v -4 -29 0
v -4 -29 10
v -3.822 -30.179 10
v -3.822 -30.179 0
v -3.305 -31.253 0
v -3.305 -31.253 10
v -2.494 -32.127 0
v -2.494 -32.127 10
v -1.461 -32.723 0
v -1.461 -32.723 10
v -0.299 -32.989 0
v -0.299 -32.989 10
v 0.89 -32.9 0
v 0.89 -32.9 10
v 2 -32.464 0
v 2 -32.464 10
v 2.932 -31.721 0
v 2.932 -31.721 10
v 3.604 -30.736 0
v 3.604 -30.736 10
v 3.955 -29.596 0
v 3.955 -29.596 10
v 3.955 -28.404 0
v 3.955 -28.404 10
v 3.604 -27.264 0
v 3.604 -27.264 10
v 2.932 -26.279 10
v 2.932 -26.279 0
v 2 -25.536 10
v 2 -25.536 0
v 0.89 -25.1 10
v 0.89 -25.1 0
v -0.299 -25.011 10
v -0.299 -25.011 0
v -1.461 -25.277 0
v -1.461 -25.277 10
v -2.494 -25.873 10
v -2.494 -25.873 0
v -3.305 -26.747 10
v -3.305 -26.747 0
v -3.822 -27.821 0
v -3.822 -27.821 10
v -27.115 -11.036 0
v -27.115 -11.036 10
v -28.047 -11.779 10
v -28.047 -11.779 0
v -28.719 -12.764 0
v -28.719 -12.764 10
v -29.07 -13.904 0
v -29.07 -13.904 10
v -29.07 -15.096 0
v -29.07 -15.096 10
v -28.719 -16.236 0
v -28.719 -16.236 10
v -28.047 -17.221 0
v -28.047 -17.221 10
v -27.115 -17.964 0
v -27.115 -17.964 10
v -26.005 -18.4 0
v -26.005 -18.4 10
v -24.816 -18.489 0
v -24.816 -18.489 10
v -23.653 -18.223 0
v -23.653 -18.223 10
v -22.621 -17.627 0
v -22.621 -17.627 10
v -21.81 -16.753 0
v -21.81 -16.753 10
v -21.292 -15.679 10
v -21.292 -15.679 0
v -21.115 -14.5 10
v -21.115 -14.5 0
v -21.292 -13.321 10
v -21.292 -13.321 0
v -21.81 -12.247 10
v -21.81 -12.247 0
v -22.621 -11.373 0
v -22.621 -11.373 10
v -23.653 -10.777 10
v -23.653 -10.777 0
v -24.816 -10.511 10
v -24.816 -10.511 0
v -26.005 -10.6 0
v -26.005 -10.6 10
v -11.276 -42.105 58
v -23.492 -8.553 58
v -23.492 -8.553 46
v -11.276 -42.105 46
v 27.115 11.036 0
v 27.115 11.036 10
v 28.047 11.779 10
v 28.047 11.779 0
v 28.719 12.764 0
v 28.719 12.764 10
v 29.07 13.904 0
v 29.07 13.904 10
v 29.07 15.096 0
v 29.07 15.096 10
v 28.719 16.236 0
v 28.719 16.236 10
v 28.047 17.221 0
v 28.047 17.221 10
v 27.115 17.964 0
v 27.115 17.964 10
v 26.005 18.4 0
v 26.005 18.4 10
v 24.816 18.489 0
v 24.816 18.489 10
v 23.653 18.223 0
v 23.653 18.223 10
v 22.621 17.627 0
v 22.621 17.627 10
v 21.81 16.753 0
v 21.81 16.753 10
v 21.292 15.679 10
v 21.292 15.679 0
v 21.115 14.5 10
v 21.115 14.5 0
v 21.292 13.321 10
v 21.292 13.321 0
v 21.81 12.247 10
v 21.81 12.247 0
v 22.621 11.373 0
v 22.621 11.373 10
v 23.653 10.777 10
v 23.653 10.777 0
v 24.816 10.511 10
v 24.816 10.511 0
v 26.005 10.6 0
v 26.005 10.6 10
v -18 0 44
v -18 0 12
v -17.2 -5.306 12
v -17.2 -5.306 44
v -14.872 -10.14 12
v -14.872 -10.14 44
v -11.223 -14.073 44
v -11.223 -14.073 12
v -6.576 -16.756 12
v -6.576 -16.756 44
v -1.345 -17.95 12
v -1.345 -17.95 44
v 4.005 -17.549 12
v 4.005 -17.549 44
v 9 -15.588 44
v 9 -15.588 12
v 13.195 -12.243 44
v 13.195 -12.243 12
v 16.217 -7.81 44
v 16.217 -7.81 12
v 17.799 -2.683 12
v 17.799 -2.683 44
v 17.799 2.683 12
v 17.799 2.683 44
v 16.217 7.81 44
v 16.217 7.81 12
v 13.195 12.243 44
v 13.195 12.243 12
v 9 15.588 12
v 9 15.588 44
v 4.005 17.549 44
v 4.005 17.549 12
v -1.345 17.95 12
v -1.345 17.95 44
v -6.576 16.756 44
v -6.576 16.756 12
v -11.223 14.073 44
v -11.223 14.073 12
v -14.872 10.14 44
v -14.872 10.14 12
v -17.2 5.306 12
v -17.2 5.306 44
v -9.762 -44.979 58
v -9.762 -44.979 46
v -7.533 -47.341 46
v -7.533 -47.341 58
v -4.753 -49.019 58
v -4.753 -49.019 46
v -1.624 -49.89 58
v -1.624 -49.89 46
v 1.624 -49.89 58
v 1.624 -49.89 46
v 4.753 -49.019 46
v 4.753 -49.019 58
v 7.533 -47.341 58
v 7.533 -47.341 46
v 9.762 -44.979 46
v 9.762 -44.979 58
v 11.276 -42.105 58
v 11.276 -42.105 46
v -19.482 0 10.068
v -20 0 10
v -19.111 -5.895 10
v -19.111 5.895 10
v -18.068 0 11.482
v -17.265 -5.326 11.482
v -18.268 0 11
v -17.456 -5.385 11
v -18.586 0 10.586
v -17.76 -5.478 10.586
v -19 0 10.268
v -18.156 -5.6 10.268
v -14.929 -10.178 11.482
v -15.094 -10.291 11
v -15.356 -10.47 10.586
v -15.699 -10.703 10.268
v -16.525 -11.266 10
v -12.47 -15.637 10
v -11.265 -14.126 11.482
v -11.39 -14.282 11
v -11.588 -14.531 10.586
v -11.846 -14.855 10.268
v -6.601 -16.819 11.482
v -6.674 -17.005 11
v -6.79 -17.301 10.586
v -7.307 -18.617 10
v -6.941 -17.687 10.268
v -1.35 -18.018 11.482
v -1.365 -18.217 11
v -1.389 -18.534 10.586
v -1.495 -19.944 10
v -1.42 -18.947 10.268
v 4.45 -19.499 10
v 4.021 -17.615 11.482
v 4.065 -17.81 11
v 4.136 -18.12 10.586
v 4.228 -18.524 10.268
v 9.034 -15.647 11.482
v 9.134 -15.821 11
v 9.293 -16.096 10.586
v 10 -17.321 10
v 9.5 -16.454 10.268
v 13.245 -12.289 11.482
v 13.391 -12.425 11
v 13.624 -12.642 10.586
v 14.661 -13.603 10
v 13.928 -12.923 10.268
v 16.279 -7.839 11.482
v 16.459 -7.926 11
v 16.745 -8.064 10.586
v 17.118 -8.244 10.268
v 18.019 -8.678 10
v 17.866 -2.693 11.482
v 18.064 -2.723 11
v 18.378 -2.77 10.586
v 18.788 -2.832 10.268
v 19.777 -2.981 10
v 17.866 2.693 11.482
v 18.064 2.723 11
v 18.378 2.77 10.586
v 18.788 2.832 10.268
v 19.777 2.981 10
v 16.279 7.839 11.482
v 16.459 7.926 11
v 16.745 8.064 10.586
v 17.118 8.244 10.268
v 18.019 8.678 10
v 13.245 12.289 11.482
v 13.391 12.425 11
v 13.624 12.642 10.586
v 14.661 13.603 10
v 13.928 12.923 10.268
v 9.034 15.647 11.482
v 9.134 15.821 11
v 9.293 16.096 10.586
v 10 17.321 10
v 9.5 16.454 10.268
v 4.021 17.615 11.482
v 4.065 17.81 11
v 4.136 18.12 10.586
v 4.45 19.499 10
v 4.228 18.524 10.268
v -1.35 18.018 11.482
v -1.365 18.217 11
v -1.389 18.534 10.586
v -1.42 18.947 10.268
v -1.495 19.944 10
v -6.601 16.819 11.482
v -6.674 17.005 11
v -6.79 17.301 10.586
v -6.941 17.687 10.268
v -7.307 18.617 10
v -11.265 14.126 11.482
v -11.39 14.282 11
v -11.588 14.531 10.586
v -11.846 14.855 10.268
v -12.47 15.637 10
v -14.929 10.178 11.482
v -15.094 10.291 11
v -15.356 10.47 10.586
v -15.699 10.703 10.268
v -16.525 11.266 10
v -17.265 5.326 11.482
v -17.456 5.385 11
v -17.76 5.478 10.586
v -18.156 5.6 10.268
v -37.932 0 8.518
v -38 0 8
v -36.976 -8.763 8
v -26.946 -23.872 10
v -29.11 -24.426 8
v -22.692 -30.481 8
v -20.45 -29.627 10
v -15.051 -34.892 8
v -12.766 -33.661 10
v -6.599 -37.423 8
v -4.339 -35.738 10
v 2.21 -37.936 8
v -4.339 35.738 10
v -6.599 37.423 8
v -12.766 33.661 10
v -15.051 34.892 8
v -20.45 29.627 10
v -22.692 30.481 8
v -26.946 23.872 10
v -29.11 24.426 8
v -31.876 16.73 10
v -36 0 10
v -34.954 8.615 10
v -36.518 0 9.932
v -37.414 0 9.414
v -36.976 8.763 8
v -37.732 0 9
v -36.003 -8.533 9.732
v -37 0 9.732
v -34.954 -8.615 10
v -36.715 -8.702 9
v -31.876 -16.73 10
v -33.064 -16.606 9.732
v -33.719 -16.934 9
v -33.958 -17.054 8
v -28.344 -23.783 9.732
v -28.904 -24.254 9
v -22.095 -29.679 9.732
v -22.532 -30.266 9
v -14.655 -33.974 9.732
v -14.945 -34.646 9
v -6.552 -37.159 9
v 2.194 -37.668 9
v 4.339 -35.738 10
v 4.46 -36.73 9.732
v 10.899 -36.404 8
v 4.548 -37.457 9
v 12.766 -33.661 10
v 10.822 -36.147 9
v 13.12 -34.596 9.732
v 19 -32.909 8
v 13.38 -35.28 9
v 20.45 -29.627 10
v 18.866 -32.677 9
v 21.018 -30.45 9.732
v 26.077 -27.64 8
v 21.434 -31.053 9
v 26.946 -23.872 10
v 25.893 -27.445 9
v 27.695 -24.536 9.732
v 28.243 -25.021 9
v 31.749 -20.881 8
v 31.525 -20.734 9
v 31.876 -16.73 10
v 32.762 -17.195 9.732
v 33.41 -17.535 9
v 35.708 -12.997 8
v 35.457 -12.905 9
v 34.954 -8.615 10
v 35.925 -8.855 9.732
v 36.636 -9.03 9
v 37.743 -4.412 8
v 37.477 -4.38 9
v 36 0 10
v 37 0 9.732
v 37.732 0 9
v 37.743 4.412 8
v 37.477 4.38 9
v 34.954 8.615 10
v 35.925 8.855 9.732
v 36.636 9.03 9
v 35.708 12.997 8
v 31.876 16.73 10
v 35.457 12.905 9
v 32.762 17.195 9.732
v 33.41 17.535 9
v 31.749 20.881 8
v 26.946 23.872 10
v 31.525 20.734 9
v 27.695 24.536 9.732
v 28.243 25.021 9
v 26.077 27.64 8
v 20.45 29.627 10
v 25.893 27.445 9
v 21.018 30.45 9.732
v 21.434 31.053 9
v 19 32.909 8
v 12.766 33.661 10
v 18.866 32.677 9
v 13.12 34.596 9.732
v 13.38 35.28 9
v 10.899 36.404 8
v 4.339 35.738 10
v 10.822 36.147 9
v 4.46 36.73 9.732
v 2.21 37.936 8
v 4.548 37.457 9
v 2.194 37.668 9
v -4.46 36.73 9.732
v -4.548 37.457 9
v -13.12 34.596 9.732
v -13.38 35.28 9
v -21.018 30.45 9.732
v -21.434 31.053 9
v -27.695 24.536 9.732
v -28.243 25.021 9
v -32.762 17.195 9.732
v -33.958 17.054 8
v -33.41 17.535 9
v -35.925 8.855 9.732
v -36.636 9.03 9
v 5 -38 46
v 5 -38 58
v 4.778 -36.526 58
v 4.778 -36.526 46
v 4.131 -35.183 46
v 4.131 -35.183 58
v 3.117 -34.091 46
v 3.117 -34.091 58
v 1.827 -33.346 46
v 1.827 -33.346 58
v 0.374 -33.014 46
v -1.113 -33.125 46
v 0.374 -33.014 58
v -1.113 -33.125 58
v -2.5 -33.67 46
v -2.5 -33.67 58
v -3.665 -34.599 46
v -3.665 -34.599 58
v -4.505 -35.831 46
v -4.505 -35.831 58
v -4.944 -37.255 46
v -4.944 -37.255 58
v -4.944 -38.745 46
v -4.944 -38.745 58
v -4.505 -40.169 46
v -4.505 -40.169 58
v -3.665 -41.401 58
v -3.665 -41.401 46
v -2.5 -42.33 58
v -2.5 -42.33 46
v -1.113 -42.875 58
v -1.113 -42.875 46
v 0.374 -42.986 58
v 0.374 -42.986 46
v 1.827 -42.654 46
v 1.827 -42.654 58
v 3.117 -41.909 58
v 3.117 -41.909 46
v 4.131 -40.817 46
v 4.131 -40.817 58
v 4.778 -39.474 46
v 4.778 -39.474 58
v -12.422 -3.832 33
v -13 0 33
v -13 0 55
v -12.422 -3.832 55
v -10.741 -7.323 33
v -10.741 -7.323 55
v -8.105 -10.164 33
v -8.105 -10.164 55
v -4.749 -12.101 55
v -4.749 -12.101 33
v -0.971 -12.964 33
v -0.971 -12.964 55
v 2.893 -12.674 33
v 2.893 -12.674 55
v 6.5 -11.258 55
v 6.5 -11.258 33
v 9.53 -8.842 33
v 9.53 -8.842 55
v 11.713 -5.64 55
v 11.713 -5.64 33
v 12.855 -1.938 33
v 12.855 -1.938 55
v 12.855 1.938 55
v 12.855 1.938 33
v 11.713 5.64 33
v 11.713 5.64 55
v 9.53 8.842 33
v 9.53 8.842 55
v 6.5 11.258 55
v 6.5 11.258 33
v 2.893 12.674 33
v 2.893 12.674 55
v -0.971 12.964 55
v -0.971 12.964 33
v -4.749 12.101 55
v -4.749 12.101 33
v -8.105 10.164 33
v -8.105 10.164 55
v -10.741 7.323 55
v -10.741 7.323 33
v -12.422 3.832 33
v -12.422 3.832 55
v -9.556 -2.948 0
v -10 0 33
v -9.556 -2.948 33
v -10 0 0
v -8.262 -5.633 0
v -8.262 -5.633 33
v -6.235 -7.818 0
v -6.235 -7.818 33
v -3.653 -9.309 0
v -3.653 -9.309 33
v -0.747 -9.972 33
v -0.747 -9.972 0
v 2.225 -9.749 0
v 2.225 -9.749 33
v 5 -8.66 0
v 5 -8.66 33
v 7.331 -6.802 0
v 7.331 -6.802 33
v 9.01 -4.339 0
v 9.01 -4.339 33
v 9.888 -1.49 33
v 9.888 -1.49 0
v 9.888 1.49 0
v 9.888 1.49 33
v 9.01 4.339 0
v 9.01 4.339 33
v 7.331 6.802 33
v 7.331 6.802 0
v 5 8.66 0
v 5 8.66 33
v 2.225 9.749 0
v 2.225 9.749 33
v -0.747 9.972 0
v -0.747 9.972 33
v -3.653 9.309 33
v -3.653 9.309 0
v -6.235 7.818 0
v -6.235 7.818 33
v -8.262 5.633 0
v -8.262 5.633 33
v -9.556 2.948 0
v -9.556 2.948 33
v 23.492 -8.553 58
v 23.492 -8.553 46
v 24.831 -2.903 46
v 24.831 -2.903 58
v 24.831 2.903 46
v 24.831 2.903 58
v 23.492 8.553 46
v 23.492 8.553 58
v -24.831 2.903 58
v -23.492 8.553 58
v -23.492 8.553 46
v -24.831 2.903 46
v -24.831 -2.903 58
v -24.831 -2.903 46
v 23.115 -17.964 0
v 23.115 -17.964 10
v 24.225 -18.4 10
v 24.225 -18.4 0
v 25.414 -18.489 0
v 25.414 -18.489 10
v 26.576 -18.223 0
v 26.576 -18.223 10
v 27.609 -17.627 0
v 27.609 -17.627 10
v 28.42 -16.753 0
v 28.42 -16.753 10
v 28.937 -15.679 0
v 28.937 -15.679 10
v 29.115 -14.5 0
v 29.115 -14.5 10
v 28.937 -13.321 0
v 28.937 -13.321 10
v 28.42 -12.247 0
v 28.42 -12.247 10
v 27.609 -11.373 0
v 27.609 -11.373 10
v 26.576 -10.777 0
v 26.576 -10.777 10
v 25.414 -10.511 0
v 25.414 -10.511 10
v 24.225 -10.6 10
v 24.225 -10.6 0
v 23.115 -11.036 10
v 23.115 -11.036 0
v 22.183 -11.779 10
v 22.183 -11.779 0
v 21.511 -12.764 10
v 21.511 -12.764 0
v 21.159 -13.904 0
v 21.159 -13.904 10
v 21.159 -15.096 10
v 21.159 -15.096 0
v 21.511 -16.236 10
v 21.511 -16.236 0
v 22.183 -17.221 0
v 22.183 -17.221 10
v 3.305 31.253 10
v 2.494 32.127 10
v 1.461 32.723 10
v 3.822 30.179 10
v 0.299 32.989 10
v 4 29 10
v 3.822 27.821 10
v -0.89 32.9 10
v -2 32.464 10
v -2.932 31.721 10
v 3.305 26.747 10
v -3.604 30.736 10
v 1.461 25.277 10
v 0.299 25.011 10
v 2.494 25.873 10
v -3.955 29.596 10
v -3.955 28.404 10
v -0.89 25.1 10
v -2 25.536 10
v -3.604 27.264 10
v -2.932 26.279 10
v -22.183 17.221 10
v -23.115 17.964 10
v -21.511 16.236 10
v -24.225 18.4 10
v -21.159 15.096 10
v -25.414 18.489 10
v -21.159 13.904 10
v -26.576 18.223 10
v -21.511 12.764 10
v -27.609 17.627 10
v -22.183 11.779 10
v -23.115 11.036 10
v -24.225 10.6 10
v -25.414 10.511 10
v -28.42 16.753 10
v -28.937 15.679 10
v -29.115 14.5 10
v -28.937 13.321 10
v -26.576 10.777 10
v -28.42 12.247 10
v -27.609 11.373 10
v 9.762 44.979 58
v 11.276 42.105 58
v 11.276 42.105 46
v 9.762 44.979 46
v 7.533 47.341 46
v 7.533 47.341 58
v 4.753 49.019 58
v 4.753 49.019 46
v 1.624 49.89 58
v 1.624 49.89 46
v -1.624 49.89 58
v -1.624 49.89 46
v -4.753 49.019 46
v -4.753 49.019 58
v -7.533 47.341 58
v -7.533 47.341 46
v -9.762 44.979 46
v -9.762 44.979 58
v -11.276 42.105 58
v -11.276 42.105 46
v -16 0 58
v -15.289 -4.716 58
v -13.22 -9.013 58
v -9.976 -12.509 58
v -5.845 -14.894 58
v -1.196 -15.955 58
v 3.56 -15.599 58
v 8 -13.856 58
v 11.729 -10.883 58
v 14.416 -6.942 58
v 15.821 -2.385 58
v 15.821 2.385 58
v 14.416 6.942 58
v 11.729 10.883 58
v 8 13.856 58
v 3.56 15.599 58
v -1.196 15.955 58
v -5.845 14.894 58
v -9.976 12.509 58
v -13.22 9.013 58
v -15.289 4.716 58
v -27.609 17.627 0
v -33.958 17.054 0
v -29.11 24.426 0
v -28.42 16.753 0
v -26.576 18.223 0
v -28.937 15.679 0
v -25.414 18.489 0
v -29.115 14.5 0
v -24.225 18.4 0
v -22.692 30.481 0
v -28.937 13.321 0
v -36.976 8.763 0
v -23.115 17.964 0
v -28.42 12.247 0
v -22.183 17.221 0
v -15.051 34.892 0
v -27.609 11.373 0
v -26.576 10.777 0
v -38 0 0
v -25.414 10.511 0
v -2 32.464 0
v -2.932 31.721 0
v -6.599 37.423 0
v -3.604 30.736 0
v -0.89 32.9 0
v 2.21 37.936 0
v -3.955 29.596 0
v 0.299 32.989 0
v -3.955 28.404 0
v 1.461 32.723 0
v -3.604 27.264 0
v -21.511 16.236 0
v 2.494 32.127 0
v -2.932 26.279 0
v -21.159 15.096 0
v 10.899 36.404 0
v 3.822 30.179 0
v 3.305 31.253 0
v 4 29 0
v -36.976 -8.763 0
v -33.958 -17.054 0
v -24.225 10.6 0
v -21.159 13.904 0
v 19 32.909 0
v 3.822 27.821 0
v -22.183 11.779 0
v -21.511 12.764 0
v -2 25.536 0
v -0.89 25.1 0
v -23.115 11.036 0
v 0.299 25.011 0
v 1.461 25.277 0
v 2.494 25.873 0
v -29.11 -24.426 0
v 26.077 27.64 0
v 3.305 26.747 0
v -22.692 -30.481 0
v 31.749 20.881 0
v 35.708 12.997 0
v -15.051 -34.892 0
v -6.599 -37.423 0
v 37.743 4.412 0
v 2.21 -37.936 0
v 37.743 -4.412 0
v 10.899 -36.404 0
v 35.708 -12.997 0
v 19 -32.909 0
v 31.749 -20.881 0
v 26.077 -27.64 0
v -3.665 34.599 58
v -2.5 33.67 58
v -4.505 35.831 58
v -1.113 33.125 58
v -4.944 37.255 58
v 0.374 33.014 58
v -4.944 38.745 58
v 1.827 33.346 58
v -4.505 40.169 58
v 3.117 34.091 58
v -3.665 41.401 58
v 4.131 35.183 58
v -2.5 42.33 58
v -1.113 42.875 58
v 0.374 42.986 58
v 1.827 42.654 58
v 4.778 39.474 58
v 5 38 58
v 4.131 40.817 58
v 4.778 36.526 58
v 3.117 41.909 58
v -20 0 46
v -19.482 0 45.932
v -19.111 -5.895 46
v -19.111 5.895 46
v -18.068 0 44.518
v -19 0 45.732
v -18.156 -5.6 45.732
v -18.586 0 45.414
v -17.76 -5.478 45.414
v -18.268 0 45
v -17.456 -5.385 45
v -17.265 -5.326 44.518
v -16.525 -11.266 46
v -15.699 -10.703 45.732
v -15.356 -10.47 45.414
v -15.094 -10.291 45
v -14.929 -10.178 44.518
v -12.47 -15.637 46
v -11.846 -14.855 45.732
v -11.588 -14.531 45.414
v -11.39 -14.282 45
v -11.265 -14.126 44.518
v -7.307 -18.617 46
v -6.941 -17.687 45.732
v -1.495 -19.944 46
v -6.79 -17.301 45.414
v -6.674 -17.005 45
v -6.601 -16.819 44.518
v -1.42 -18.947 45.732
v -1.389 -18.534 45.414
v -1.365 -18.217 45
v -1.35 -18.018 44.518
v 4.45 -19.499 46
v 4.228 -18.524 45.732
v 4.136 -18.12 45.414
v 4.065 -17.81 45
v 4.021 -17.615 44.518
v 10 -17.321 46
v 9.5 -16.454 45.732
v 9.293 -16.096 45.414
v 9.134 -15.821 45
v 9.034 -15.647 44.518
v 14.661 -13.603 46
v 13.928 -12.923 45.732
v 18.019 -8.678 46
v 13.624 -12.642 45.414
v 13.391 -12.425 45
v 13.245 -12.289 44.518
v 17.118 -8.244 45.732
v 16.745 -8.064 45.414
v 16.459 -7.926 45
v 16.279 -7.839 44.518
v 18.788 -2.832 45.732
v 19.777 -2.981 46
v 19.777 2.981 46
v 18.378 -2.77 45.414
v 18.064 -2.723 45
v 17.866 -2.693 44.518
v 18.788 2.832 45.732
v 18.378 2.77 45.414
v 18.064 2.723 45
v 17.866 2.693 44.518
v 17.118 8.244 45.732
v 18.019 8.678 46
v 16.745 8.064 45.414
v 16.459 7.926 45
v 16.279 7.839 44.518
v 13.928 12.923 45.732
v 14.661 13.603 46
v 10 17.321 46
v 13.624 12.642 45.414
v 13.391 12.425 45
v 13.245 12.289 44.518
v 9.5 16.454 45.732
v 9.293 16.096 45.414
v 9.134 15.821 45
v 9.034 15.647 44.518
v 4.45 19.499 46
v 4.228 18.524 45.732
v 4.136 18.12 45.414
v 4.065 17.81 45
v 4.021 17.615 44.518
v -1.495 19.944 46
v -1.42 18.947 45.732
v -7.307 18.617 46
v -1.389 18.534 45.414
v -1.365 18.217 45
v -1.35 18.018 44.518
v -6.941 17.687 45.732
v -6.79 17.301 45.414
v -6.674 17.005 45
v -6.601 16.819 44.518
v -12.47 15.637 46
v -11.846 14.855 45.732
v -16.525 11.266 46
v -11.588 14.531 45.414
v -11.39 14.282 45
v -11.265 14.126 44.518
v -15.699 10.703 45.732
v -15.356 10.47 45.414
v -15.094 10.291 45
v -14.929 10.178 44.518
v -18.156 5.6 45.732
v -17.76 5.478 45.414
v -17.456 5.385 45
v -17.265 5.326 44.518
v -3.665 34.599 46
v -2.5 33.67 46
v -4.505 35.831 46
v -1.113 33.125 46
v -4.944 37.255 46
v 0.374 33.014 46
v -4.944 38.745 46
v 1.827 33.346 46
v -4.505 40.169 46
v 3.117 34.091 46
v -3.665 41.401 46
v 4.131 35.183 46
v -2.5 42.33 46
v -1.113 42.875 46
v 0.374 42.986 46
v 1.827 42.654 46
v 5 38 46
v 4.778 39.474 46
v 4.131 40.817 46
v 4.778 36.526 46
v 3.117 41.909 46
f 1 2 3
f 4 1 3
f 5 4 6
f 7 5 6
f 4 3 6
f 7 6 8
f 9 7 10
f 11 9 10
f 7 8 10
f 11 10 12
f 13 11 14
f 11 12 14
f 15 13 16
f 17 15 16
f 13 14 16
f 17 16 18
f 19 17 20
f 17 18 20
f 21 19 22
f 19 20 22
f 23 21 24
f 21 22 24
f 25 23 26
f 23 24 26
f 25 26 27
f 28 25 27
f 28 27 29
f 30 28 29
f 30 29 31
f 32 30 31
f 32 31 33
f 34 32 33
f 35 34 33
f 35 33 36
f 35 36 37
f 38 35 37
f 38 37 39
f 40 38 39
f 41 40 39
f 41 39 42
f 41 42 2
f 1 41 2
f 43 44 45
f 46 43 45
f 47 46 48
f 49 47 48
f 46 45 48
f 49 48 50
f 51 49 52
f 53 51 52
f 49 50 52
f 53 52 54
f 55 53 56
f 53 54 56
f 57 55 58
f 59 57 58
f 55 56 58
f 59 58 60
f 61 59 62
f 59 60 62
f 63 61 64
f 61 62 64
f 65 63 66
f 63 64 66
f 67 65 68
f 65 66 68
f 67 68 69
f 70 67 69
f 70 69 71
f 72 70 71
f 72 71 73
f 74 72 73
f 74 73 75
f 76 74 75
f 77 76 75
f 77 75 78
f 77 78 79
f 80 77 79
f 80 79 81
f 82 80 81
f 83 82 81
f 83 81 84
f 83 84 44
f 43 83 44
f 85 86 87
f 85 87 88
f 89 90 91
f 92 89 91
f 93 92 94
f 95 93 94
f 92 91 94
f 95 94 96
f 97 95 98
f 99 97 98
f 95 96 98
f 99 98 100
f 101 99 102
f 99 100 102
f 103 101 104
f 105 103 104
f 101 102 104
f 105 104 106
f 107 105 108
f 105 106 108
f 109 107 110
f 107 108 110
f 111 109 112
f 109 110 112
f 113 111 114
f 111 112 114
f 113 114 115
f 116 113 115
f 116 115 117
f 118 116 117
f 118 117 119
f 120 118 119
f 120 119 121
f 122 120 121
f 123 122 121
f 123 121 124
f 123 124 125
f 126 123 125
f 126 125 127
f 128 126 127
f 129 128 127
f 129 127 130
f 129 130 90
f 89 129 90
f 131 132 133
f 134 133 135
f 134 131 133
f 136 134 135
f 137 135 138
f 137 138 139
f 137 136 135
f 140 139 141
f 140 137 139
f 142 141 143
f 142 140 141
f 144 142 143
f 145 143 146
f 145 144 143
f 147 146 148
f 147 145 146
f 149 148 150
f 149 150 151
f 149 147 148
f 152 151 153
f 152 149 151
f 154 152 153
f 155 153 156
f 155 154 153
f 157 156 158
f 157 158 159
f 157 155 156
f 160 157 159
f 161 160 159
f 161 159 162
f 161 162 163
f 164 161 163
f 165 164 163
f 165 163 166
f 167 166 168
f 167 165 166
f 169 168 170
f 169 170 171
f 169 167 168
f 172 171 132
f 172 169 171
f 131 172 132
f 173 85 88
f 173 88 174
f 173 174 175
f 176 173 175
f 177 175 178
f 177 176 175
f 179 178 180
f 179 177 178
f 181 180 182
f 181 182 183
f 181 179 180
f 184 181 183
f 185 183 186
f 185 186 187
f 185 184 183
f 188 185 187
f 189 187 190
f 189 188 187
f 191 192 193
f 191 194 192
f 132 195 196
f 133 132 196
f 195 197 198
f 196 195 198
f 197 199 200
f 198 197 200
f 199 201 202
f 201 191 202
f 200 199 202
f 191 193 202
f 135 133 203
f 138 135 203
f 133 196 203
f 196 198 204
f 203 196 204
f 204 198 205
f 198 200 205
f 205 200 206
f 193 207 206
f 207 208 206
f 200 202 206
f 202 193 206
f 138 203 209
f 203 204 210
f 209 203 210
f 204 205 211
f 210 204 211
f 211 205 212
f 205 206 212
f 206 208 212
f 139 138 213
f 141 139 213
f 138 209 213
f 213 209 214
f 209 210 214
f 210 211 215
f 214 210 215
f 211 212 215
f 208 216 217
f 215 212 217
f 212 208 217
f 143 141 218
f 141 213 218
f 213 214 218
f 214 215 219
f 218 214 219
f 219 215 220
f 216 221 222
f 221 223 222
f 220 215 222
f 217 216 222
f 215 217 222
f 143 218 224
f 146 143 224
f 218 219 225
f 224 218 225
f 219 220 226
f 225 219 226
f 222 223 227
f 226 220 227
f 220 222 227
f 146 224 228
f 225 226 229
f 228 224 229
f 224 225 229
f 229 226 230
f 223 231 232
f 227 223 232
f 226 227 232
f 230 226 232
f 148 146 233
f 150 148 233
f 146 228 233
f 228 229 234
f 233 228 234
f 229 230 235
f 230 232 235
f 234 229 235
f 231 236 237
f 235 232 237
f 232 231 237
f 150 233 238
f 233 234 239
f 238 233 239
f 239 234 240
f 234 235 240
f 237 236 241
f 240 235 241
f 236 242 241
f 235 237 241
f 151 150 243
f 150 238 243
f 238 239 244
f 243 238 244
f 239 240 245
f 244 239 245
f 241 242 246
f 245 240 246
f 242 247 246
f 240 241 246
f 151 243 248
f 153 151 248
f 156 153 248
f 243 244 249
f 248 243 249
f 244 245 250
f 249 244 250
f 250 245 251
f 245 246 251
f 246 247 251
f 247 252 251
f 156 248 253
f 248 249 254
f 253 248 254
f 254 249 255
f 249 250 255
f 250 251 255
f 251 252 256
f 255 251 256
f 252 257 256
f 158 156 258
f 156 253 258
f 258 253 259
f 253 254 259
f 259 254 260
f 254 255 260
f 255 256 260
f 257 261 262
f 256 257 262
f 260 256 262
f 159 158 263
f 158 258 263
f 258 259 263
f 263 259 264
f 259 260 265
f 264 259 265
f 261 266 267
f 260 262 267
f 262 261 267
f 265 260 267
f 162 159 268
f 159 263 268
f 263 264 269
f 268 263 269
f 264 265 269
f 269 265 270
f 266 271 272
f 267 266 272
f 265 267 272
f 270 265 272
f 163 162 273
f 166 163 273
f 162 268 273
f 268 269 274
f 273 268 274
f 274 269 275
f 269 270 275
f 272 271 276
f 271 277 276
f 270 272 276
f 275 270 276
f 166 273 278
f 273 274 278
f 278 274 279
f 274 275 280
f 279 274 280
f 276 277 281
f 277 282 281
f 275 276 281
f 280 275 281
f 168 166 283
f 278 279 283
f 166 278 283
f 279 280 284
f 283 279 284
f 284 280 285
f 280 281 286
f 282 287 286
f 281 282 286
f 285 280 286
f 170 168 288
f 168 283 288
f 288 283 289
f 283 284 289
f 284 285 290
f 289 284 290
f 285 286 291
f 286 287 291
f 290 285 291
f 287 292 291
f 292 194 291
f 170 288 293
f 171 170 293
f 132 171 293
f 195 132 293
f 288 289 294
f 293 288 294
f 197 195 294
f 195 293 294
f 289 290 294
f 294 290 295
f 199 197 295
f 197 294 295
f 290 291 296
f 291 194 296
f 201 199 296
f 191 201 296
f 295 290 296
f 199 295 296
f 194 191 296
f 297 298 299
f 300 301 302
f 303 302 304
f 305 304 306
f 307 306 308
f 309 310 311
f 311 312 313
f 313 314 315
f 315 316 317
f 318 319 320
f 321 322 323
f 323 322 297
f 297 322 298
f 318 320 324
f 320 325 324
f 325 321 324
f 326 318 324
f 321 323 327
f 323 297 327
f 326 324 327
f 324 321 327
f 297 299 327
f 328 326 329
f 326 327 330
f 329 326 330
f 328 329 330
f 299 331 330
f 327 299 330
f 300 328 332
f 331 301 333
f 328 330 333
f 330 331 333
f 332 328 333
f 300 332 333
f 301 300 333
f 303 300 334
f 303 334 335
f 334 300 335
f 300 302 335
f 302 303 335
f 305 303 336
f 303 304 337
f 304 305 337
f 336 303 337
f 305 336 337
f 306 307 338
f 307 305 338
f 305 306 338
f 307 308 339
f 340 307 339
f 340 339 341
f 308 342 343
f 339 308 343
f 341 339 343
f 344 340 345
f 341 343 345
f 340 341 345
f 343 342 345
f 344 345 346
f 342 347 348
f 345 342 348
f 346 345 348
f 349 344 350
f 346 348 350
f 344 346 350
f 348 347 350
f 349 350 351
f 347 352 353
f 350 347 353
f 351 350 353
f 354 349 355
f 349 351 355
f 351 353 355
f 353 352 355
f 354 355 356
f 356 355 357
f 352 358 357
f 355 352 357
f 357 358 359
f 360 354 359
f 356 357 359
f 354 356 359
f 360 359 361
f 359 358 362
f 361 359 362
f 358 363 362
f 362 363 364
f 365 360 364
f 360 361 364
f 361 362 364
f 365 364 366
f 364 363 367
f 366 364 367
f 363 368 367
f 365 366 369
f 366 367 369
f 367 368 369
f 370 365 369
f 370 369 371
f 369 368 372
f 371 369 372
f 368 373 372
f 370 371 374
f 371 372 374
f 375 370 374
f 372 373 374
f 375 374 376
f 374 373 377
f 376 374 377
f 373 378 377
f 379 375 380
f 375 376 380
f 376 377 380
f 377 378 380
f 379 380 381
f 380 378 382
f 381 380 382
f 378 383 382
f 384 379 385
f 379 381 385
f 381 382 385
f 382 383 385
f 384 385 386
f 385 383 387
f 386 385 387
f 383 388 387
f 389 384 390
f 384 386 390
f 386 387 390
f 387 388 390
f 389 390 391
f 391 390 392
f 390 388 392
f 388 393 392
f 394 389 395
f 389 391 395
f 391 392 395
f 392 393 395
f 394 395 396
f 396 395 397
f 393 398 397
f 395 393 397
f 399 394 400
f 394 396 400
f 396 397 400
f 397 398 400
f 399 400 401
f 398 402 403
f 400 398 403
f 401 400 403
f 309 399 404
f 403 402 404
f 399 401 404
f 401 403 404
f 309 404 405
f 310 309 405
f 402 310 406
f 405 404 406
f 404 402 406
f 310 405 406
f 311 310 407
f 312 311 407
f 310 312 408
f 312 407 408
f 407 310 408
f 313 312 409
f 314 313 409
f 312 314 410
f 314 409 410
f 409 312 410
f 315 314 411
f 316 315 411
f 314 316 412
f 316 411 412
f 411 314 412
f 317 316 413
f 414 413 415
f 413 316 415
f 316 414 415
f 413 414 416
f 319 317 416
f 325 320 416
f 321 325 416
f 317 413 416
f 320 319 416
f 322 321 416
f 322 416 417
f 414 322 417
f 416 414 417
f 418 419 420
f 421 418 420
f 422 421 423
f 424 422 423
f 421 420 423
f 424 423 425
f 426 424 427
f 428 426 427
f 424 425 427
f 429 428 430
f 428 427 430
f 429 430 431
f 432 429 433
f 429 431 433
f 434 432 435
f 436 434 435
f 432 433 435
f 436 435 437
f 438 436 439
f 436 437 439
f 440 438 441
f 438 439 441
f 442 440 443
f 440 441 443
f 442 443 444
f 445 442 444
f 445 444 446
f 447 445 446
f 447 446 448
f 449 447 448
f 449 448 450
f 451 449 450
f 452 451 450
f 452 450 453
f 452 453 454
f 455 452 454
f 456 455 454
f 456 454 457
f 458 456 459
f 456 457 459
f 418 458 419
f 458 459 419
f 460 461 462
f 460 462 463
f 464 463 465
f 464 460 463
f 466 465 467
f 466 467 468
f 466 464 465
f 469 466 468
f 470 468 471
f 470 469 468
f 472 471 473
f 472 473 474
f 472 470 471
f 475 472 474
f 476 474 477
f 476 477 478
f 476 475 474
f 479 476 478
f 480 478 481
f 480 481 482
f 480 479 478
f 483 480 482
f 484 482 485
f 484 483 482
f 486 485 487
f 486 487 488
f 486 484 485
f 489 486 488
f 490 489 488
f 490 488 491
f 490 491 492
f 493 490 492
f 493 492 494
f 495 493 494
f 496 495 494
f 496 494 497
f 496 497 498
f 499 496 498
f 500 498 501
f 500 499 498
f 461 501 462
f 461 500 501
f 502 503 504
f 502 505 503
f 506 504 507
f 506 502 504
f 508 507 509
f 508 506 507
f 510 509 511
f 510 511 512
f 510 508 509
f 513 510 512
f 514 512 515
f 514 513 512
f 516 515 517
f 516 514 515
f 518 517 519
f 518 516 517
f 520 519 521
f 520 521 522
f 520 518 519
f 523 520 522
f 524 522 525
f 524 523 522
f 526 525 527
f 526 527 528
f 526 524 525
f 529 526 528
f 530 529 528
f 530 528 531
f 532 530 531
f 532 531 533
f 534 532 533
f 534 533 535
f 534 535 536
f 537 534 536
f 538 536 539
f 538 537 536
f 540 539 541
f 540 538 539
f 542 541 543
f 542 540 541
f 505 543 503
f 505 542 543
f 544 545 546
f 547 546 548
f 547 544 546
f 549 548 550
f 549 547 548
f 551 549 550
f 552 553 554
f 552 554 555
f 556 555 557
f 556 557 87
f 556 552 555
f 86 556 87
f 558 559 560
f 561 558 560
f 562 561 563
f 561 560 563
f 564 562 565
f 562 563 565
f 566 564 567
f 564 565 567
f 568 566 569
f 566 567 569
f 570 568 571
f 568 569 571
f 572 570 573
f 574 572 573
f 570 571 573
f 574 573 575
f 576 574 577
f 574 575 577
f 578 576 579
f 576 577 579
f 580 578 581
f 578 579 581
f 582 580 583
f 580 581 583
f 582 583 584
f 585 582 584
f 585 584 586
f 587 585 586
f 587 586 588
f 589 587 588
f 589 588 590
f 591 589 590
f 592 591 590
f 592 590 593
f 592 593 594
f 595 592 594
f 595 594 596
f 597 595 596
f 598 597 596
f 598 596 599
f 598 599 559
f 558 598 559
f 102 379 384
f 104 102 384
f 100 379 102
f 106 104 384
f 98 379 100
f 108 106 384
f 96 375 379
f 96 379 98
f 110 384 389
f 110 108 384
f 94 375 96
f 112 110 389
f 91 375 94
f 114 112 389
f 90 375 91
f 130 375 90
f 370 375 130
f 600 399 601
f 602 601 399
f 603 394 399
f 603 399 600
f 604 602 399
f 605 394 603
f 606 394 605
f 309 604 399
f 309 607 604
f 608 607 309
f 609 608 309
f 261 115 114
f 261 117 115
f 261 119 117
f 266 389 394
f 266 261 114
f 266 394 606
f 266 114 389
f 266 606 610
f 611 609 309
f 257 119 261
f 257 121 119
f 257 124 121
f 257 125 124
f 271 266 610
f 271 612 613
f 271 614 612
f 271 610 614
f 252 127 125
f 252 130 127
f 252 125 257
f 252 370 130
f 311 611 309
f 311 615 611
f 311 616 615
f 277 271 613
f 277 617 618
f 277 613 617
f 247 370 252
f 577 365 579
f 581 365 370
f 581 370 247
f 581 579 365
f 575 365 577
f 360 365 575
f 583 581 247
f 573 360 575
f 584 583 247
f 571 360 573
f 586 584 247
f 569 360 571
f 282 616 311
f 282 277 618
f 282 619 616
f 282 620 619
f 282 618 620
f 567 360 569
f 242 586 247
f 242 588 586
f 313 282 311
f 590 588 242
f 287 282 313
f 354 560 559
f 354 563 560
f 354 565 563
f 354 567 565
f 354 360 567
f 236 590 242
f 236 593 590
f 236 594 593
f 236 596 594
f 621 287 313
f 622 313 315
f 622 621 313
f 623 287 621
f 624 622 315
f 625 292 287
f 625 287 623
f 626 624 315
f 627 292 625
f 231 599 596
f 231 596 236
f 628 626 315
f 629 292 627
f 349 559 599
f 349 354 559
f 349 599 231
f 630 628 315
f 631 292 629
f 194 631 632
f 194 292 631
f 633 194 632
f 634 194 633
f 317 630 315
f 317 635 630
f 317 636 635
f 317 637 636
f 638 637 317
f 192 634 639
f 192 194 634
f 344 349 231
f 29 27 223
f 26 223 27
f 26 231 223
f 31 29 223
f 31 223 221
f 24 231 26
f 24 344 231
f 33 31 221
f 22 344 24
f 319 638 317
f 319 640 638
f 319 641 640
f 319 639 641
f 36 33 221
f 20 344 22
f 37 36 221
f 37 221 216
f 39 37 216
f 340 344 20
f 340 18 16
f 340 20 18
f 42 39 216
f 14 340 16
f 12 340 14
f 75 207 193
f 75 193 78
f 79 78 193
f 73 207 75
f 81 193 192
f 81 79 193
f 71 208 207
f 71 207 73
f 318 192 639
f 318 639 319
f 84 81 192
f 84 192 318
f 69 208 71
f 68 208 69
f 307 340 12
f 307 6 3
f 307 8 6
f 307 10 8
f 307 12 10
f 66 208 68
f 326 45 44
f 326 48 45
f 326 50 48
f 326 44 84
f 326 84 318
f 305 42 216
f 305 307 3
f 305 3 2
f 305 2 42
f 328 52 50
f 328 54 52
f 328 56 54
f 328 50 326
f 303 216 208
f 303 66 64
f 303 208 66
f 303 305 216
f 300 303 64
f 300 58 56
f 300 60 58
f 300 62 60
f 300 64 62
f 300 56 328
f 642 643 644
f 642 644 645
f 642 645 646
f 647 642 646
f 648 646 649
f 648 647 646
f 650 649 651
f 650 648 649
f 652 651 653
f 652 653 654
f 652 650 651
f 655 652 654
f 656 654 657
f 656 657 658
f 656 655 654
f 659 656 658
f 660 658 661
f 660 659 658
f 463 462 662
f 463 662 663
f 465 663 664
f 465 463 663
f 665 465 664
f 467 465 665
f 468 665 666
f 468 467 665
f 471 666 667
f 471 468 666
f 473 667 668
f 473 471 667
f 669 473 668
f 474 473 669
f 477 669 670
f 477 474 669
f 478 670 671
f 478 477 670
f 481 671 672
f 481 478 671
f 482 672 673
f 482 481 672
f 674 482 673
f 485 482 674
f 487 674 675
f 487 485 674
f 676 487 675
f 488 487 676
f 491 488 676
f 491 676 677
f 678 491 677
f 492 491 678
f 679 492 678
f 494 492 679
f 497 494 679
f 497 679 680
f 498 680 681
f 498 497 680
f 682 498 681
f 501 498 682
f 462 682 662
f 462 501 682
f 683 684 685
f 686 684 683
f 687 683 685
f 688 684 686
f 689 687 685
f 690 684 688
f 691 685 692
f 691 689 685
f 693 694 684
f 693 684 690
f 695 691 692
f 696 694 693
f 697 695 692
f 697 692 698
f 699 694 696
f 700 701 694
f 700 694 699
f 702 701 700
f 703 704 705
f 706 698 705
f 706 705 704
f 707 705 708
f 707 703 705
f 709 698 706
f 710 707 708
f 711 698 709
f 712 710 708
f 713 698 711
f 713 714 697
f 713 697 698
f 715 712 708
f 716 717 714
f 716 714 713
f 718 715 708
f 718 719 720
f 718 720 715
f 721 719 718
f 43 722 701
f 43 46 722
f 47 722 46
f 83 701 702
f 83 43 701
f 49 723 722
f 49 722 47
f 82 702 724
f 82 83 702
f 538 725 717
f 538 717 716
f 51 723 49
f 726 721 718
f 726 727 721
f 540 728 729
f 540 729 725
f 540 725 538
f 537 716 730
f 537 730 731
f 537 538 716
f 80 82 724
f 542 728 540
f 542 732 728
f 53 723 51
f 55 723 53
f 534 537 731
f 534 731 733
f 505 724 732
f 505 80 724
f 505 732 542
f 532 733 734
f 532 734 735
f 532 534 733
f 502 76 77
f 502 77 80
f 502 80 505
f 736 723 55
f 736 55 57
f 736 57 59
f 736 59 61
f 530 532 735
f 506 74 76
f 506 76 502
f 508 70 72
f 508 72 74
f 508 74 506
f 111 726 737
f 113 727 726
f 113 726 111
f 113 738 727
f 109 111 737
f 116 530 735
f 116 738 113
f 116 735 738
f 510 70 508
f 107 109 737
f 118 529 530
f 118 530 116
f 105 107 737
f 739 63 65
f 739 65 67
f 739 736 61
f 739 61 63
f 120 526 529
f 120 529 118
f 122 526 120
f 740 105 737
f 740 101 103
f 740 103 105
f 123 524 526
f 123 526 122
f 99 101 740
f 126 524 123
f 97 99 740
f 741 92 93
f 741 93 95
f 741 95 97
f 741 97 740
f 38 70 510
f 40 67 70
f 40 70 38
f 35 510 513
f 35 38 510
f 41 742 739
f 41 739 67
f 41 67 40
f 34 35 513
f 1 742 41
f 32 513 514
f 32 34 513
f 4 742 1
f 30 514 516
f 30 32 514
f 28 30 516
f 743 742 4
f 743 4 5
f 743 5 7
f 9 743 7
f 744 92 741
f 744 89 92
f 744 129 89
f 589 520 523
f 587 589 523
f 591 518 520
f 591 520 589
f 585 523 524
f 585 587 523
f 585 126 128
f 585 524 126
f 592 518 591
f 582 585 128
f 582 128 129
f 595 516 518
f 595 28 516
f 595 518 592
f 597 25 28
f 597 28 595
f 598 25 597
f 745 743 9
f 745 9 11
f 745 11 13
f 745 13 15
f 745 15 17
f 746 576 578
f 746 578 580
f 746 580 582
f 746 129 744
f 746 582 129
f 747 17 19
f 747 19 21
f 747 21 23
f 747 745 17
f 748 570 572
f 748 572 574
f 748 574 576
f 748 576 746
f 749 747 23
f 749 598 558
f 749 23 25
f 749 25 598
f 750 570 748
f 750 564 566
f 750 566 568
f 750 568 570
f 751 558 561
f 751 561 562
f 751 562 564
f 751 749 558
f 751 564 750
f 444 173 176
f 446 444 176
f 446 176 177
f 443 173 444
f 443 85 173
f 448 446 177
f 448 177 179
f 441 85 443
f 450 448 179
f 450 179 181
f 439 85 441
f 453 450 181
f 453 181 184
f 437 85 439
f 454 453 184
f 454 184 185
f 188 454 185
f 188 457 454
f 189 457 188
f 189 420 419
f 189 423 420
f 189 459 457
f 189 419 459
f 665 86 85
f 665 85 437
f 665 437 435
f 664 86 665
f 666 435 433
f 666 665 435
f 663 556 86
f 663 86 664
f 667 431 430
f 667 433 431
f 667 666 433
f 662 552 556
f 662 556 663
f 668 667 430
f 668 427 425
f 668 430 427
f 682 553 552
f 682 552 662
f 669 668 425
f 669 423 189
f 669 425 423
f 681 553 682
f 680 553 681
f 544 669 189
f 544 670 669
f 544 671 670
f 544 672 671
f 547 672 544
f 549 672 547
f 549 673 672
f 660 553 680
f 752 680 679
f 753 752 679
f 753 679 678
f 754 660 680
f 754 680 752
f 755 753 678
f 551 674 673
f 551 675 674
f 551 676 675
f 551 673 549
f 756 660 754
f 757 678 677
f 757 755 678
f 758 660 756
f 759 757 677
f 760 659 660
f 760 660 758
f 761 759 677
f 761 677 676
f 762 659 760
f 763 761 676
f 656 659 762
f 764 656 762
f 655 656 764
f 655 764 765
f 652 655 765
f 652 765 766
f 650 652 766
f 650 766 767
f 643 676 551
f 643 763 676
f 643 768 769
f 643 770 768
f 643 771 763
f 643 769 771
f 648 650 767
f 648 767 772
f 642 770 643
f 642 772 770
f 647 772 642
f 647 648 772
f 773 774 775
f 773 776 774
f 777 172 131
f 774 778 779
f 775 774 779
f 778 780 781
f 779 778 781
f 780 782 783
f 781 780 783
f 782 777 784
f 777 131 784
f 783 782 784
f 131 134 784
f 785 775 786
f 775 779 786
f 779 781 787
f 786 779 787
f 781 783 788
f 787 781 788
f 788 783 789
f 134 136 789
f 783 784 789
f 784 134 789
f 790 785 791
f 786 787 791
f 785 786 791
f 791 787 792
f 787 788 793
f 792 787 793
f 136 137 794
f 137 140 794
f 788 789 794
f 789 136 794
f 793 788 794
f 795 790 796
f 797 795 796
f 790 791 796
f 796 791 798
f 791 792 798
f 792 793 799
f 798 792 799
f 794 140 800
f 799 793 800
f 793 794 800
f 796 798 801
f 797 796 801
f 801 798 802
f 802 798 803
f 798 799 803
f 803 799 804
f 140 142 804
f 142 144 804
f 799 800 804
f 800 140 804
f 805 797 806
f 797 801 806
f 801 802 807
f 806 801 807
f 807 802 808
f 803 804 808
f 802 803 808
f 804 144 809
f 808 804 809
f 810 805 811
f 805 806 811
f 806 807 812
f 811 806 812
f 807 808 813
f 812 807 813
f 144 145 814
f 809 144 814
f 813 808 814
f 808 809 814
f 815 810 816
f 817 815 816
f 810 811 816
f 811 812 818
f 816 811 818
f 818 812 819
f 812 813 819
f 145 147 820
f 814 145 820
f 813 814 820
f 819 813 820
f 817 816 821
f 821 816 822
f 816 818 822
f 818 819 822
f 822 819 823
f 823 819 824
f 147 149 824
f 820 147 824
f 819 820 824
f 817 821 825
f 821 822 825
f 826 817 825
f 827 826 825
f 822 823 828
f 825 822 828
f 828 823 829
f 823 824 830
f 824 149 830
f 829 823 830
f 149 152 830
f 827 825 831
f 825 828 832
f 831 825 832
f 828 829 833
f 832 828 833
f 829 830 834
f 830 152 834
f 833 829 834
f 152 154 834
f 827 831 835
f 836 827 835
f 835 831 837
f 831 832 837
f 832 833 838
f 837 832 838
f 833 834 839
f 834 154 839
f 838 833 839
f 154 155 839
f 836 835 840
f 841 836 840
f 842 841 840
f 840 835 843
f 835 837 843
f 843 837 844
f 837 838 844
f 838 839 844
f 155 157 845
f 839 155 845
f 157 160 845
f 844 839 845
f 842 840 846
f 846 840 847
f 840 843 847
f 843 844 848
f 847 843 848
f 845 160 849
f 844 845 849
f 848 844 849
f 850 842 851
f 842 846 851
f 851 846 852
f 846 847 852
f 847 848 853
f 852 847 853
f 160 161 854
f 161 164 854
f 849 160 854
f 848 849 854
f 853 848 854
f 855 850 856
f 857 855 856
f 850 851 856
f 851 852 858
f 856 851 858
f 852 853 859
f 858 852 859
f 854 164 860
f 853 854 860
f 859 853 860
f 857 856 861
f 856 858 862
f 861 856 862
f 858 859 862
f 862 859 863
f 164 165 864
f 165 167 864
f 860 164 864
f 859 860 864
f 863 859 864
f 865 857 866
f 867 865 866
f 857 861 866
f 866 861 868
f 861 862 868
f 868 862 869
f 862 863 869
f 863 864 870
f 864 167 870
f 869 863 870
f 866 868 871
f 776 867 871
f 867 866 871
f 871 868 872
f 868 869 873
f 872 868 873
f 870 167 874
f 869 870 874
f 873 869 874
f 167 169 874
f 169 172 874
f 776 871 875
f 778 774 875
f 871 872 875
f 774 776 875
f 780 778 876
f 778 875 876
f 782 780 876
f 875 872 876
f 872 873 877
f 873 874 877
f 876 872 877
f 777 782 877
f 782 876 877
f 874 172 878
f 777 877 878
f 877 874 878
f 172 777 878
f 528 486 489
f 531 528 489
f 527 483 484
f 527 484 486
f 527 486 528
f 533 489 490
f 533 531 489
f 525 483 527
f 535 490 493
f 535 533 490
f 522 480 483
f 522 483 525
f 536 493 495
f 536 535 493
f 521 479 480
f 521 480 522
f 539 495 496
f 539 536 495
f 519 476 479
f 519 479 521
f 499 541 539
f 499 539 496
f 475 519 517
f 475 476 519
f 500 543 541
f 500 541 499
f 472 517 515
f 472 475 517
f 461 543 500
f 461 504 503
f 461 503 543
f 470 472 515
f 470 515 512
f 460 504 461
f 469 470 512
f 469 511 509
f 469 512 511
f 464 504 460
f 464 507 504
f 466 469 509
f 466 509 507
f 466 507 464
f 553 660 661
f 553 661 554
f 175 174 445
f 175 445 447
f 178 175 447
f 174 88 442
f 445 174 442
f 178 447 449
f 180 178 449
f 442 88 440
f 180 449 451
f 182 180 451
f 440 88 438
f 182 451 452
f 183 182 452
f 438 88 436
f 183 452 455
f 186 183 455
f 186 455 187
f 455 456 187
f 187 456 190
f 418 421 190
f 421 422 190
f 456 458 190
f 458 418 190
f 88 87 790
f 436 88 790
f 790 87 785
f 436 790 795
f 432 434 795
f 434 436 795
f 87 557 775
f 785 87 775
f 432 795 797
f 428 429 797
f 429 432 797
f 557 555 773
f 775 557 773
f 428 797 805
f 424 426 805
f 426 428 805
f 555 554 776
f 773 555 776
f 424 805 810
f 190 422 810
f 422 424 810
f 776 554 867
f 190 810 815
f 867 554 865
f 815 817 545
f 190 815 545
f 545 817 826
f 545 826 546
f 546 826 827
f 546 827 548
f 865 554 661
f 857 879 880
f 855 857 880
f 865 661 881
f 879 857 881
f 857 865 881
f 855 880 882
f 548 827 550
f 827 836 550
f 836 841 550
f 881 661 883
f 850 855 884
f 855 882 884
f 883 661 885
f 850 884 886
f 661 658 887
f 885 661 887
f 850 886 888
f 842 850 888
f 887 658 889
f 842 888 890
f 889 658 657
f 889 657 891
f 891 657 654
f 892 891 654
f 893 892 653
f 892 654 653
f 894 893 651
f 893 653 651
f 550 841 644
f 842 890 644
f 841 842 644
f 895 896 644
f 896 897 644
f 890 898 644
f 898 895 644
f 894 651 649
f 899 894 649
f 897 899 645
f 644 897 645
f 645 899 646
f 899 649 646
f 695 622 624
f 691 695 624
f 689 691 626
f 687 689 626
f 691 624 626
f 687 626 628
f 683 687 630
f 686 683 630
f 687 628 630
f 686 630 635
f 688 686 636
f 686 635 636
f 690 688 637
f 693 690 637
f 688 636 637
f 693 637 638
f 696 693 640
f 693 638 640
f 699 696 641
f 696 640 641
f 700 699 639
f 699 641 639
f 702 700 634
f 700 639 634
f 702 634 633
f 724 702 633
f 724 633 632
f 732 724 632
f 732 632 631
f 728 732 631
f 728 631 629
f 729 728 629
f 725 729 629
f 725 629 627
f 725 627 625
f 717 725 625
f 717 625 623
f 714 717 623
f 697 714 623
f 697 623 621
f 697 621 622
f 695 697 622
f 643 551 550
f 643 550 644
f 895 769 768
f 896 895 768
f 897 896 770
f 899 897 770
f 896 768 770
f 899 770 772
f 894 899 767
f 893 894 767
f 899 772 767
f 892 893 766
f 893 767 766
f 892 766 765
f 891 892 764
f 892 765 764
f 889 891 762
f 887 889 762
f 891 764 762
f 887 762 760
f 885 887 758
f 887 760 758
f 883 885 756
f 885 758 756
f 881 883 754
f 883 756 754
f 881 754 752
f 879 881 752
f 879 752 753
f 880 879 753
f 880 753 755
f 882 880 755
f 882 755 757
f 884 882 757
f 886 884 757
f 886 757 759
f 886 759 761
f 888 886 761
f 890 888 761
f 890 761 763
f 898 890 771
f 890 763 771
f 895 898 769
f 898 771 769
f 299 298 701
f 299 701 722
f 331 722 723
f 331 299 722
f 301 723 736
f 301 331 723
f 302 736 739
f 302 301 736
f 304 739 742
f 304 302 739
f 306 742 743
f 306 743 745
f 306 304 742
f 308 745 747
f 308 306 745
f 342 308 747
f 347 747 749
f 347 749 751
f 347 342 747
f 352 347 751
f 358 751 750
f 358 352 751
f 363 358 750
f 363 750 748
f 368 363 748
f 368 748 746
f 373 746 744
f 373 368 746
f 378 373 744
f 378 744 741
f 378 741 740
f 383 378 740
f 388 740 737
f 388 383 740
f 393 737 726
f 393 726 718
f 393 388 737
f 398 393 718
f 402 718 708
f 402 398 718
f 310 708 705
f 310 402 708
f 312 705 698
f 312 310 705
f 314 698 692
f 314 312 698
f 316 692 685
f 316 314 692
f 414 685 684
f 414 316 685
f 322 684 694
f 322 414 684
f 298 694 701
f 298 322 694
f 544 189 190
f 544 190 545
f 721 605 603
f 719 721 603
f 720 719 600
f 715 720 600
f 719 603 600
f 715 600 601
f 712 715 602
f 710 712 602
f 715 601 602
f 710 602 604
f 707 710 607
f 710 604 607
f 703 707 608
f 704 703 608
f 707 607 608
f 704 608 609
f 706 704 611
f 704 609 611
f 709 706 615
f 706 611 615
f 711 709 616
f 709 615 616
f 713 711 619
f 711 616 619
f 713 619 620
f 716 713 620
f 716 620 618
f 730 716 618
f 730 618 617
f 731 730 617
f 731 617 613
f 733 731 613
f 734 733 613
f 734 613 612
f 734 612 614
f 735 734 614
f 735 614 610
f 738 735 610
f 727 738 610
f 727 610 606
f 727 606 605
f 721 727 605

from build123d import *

# Parameters (mm, degrees)
SKETCH_2_R               = 4
CUT_EXTRUDE_1_DEPTH      = 73.055534139
PATTERN_CIRCULAR_1_COUNT = 6
SKETCH_3_R               = 5
SKETCH_3_R_2             = 25
SKETCH_3_R_3             = 18
EXTRUDE_2_DEPTH          = 12
CHAMFER_1_SIZE           = 3
FILLET_1_R               = 2


with BuildPart() as part:
    # 草圖1 → 旋轉1 (revolve)
    with BuildSketch(Plane(origin=(0, 0, 0), x_dir=(0, 0, -1), z_dir=(1, 0, 0)), mode=Mode.PRIVATE) as revolve_1_sk:
        Polygon((0, 0), (0, 38), (-10, 38), (-10, 18), (-58, 18), (-58, 0), align=None)
    revolve(revolve_1_sk.sketch.rotate(Axis((0, 0, 0), (0, 0, 1)), 90), axis=Axis((0, 0, 0), (0, 0, 1)))

    # 草圖2 → 伸長1 (cut, through all)
    with BuildSketch(Plane.XY.offset(10)):
        with Locations((0, 29)):
            Circle(SKETCH_2_R)
    cut_extrude_1 = extrude(amount=-CUT_EXTRUDE_1_DEPTH, mode=Mode.SUBTRACT)

    # 環狀複製排列1: 伸長1 ×6 about axis
    pattern_circular_1_axis = Axis((0, 0, 0), (0, 0, 1))
    for i in range(1, PATTERN_CIRCULAR_1_COUNT):
        add(cut_extrude_1.rotate(pattern_circular_1_axis, i * 360 / PATTERN_CIRCULAR_1_COUNT), mode=Mode.SUBTRACT)

    # 草圖3 → 伸長2 (add)
    # profile 1 of 3: a face of its own
    with BuildSketch(Plane.XY.offset(58)):
        with BuildLine():
            Line((-11.275939624, 42.105263158), (-23.491540883, 8.552631579))
            ThreePointArc((-23.491540883, 8.552631579), (0, 25), (23.491540883, 8.552631579))
            Line((23.491540883, 8.552631579), (11.275939624, 42.105263158))
            ThreePointArc((11.275939624, 42.105263158), (0, 50), (-11.275939624, 42.105263158))
        make_face()
        with Locations((0, 38)):
            Circle(SKETCH_3_R, mode=Mode.SUBTRACT)
    # profile 2 of 3: a face of its own
    with BuildSketch(Plane.XY.offset(58)):
        Circle(SKETCH_3_R_2)
        with Locations(Location((0, 0, 0), (0, 0, 180))):
            Circle(SKETCH_3_R_3, mode=Mode.SUBTRACT)
    # profile 3 of 3: a face of its own
    with BuildSketch(Plane.XY.offset(58)):
        with BuildLine():
            ThreePointArc((23.491540883, -8.552631579), (0, -25), (-23.491540883, -8.552631579))
            Line((-23.491540883, -8.552631579), (-11.275939624, -42.105263158))
            ThreePointArc((-11.275939624, -42.105263158), (0, -50), (11.275939624, -42.105263158))
            Line((11.275939624, -42.105263158), (23.491540883, -8.552631579))
        make_face()
        with Locations((0, -38)):
            Circle(SKETCH_3_R, mode=Mode.SUBTRACT)
    extrude(amount=-EXTRUDE_2_DEPTH)

    # 草圖4 → 除料-旋轉1 (revolve, cut)
    with BuildSketch(Plane(origin=(0, 0, 0), x_dir=(0, 0, -1), z_dir=(1, 0, 0)), mode=Mode.PRIVATE) as cut_revolve_1_sk:
        Polygon((-58, 0), (-58, 13), (-33, 13), (-33, 10), (0, 10), (0, 0), align=None)
    revolve(cut_revolve_1_sk.sketch.rotate(Axis((0, 0, 0), (0, 0, 1)), 90), axis=Axis((0, 0, 0), (0, 0, 1)), mode=Mode.SUBTRACT)

    # 導角1
    chamfer_1_edges = [part.edges().sort_by_distance(p)[0] for p in [
        (13, 0, 58),
    ]]
    chamfer(chamfer_1_edges, length=CHAMFER_1_SIZE)

    # 圓角1
    fillet_1_edges = [part.edges().sort_by_distance(p)[0] for p in [
        (18, 0, 46),
        (18, 0, 10),
        (38, 0, 10),
    ]]
    fillet(fillet_1_edges, radius=FILLET_1_R)


solid = part.part
